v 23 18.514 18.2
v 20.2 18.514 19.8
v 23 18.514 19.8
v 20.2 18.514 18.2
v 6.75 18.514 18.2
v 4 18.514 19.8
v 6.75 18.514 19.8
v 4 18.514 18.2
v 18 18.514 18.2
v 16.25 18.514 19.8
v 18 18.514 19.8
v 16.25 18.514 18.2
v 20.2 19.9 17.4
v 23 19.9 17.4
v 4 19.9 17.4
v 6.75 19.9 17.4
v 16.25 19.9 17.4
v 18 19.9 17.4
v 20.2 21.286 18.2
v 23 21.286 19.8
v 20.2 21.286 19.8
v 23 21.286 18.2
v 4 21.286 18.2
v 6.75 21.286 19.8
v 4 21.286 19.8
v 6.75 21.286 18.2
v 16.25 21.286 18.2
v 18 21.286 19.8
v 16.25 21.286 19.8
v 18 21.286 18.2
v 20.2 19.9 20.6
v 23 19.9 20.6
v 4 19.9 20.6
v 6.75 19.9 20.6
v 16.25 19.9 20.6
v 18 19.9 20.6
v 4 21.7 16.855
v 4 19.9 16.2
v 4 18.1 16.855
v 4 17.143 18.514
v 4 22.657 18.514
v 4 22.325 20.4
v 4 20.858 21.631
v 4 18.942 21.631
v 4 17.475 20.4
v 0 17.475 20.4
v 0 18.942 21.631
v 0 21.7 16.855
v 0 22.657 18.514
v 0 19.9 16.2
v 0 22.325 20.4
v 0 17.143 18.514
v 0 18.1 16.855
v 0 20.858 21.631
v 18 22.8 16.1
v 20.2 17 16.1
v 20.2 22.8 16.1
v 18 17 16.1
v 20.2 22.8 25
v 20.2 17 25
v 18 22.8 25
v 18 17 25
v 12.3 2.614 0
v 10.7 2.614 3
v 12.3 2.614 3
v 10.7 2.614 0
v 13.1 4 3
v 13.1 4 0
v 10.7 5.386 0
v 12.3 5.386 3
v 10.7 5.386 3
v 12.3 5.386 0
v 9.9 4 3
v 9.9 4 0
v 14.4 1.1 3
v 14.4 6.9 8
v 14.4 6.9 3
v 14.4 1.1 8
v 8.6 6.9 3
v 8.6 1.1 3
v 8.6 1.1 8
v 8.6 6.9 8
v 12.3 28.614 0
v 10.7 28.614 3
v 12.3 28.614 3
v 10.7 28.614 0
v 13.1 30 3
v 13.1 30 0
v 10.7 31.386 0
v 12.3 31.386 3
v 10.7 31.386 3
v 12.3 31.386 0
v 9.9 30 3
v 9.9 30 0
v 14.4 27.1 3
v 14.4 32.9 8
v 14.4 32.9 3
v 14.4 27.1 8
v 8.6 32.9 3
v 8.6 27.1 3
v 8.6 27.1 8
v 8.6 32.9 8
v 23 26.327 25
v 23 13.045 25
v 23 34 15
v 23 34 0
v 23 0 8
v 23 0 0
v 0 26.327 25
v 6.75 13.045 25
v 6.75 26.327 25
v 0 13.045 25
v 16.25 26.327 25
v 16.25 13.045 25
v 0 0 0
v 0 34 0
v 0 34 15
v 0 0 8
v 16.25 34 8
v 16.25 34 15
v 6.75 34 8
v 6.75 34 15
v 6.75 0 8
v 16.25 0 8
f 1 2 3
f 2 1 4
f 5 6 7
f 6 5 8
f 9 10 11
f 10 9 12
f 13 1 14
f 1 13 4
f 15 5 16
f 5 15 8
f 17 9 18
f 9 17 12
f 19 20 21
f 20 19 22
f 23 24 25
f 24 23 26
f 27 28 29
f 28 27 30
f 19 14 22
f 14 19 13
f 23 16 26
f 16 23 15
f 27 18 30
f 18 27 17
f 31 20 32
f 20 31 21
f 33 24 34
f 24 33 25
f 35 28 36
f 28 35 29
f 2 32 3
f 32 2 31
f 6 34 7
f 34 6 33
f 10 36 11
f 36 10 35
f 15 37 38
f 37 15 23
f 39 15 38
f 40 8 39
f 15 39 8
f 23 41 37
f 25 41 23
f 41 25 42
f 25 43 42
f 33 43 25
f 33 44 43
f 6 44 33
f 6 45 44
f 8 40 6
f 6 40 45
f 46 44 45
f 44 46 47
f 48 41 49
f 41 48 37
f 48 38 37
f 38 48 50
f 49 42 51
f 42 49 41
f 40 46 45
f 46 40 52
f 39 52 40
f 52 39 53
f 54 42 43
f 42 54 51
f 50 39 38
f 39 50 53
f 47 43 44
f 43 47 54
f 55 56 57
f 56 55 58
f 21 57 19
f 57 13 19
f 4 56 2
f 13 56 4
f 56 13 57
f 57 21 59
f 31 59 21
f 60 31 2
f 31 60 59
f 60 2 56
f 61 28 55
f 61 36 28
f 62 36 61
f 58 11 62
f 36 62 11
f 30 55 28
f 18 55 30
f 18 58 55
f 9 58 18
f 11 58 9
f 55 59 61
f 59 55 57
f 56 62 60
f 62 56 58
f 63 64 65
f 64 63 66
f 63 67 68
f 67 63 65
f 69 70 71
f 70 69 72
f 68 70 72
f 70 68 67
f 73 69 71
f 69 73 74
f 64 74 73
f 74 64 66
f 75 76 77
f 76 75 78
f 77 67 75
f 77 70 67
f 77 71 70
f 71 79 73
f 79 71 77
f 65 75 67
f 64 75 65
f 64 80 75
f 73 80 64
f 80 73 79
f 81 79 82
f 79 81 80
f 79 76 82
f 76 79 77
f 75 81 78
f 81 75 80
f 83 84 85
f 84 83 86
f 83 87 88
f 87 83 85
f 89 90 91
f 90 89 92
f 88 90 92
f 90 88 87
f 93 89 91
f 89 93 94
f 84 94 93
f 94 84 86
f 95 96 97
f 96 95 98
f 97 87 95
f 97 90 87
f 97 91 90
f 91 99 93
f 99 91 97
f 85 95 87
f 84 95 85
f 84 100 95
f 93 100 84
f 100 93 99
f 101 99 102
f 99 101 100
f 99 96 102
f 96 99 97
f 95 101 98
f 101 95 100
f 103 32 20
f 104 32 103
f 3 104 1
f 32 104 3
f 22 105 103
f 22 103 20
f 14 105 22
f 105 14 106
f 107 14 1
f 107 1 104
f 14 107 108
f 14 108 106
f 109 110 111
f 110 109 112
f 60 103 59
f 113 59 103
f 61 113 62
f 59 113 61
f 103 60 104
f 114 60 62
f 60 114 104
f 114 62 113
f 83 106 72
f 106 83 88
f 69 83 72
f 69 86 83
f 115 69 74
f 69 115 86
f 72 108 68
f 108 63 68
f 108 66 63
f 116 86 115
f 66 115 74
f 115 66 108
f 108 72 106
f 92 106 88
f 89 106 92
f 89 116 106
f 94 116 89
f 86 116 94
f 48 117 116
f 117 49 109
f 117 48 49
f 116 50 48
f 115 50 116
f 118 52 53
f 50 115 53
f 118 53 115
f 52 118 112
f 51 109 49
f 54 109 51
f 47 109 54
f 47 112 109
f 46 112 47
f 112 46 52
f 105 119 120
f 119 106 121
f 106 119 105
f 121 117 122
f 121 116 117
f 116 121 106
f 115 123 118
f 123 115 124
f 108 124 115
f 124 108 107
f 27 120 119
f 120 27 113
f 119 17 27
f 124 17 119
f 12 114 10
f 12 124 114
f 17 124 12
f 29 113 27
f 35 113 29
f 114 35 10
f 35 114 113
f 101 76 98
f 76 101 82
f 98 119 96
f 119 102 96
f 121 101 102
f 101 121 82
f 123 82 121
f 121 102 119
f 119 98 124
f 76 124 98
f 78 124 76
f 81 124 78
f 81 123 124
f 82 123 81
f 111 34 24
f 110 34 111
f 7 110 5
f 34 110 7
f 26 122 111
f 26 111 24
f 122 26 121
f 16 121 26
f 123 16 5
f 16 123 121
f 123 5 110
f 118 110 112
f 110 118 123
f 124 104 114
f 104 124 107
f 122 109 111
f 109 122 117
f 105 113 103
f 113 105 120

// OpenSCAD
// PIRANHA iteration1
// y belt idler
// GNU GPL v3
// Usan Siriwardana <usiriwar@uwaterloo.ca> and contributors
// based on Prusa i3 MK3S
// https://reprap.org/wiki/Prusa_i3_MK3

difference(){
	// base
	cube([23, 34, 25]);
	
	// channel for idler	
	translate([6.75, -0.5, 8])cube([9.5, 34+1,25-8+1]);
	
	// trim to size
	translate([-0.5, 0, 8])rotate([90-37.5, 0, 0])cube([23+1, 30, 20]);
	translate([-0.5, 34, 15])rotate([37.5, 0, 0])cube([23+1, 30, 20]);

	translate([0, 19.9, 19])rotate([0, 90, 0]){
		// counterbored bolt hole
		translate([0, 0, -0.5]){
			cylinder(h = 23+1, r = 1.6, center = false);
			cylinder(h = 4+0.5, r = 2.8, center = false);
		}
		
		// square nut slot
		// adding this slot does technicially make it weaker against tear out,
		// but it would probably fail from layer adhesion first anyways, which is slightly stronger now
		translate([-10/2, 0, 2.2/2 + 18])cube([5.8 + 10, 5.8, 2.2],center = true);
	}

	// mounting holes
	translate([11.5, 4, -0.5]){
		cylinder(h = 8+1, r = 1.6, center = false);
		translate([0, 0, 2.2/2 + 10/2 + 3.5])cube([5.8, 5.8, 2.2+10], center=true);
	}
	translate([11.5, 30.00, -0.5]){
		cylinder(h = 8+1, r = 1.6, center = false);
		translate([0, 0, 2.2/2 + 10/2 + 3.5])cube([5.8, 5.8, 2.2+10], center=true);
	}	
	// revision	
	translate([23/2,34/2,0])rotate([180, 0, 0])text(text = "R1", halign="center", valign="center", size=8); 
}
